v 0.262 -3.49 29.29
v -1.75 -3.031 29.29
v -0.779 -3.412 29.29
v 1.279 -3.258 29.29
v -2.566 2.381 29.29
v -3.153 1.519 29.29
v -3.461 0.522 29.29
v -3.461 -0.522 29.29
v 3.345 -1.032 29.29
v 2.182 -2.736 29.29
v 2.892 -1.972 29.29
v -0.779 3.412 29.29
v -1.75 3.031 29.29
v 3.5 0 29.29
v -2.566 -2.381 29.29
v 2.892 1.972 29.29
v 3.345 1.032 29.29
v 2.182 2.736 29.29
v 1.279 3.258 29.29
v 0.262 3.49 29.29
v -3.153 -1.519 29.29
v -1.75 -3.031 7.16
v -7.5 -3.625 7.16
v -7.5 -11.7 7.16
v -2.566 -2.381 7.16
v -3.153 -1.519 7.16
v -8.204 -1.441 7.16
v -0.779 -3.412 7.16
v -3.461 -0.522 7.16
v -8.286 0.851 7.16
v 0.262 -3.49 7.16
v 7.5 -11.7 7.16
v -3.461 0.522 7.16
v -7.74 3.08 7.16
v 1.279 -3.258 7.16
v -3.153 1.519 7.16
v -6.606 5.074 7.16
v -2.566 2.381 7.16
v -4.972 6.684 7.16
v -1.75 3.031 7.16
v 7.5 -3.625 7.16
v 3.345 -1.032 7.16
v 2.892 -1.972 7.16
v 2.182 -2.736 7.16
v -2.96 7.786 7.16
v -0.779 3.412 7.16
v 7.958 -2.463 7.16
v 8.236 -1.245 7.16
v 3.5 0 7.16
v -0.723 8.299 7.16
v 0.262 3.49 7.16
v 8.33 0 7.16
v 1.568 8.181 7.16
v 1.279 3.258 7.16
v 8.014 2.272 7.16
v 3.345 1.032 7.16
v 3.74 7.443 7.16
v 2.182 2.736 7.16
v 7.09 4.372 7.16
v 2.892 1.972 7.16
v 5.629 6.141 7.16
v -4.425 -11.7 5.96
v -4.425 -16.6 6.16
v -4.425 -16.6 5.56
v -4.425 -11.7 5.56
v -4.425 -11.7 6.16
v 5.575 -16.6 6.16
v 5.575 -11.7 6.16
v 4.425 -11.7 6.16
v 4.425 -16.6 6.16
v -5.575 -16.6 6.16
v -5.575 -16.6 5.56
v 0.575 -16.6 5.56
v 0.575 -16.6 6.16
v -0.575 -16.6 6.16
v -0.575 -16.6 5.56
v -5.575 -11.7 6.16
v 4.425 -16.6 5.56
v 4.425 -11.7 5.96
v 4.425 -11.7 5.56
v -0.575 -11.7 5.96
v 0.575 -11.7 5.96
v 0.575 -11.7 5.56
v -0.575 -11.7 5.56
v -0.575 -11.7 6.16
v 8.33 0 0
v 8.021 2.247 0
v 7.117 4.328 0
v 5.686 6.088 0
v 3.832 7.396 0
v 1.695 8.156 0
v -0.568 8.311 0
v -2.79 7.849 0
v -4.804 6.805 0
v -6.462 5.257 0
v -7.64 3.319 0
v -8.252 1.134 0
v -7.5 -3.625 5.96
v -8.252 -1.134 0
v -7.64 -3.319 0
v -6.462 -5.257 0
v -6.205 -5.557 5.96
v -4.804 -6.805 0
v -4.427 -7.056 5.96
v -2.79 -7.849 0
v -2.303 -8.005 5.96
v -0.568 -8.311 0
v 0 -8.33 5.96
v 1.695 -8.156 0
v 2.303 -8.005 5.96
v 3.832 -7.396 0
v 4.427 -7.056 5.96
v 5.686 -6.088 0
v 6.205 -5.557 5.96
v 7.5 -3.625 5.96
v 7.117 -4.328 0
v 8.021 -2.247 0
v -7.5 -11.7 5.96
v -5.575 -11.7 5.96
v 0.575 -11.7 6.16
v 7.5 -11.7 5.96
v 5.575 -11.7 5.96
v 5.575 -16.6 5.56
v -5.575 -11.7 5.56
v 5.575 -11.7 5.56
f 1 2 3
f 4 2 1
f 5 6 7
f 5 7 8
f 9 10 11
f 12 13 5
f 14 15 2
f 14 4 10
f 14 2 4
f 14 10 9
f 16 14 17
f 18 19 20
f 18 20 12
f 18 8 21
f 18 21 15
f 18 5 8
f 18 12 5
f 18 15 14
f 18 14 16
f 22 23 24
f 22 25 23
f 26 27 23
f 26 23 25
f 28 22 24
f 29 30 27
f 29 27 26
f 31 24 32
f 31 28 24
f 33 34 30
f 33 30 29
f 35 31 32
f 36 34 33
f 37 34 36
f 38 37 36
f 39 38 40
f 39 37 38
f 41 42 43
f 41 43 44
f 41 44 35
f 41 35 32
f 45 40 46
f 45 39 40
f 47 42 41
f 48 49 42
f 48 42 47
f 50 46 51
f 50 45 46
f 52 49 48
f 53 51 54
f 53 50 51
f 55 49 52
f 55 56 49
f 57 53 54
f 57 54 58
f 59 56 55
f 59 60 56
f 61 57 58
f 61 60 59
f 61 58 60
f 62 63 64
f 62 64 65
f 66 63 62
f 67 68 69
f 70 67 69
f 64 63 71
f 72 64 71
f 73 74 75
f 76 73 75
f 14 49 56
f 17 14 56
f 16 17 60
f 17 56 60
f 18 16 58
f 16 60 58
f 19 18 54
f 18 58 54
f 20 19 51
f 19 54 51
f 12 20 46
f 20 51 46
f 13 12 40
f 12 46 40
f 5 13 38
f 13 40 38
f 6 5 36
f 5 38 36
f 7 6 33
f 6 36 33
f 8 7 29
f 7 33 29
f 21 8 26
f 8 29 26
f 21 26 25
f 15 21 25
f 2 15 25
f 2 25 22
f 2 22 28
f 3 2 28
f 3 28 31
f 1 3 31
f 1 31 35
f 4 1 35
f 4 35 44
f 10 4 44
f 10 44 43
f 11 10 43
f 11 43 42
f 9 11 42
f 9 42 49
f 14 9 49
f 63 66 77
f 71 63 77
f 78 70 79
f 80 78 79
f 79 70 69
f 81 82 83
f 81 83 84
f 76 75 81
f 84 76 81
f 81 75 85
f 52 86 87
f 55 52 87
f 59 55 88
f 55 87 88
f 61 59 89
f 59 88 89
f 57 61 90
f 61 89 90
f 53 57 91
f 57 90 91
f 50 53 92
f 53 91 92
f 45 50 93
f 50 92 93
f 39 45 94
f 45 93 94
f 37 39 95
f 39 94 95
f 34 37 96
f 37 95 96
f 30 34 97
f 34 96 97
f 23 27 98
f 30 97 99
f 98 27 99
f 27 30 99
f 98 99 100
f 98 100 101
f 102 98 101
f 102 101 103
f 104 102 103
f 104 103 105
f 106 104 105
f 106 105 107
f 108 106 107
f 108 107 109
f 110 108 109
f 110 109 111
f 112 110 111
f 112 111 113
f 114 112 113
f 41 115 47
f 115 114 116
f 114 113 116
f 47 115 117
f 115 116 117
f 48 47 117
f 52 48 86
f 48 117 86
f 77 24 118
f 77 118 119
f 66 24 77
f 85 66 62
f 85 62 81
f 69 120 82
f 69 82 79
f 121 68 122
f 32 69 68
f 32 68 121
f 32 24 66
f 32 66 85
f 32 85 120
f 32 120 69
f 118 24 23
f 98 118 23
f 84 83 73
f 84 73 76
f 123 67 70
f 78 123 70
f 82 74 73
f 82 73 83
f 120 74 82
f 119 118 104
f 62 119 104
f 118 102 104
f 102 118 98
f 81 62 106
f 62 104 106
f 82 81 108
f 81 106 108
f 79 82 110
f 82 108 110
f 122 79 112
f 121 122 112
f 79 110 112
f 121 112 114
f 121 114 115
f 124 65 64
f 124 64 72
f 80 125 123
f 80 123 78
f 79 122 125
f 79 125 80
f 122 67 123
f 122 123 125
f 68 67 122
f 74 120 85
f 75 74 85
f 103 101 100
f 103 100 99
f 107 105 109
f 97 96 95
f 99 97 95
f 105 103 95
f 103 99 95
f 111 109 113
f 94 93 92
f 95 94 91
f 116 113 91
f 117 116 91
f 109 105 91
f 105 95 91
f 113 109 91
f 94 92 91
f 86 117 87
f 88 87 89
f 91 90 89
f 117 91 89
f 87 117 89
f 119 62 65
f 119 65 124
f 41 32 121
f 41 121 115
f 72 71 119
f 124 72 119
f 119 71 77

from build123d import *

# Parameters (mm, degrees)
SKETCH1_R           = 8.33
BOSS_EXTRUDE1_DEPTH = 7.16
SKETCH2_R           = 3.5
BOSS_EXTRUDE2_DEPTH = 22.13
SKETCH3_W           = 15
SKETCH3_H           = 11.20454244
BOSS_EXTRUDE3_DEPTH = 1.2
BOSS_EXTRUDE4_START = -0.2
SKETCH4_W           = 1.15
SKETCH4_H           = 4.9
BOSS_EXTRUDE4_DEPTH = 0.6
LPATTERN1_COUNT     = 2
LPATTERN1_PITCH     = 5
LPATTERN1_COL_COUNT = 2
LPATTERN1_COL_PITCH = 5


with BuildPart() as part:
    # Sketch1 → Boss-Extrude1 (new body)
    with BuildSketch(Plane.XY):
        Circle(SKETCH1_R)
    extrude(amount=BOSS_EXTRUDE1_DEPTH)

    # Sketch2 → Boss-Extrude2 (add)
    with BuildSketch(Plane.XY.offset(7.16)):
        Circle(SKETCH2_R)
    extrude(amount=BOSS_EXTRUDE2_DEPTH)

    # Sketch3 → Boss-Extrude3 (add)
    with BuildSketch(Plane.XY.offset(7.16)):
        with Locations((0, -6.09772878)):
            Rectangle(SKETCH3_W, SKETCH3_H)
    extrude(amount=-BOSS_EXTRUDE3_DEPTH)

    # Sketch4 → Boss-Extrude4 (add)
    with BuildSketch(Plane(origin=(0, 0, 5.96), x_dir=(-1, 0, 0), z_dir=(0, 0, -1)).offset(BOSS_EXTRUDE4_START)):
        with Locations((0, -14.15)):
            Rectangle(SKETCH4_W, SKETCH4_H)
    boss_extrude4 = extrude(amount=BOSS_EXTRUDE4_DEPTH)

    # LPattern1: Boss-Extrude4 ×2
    with Locations(*[(i * LPATTERN1_PITCH, 0, 0) for i in range(1, LPATTERN1_COUNT)]):
        add(boss_extrude4)

    # LPattern1 col: Boss-Extrude4 ×2
    with Locations(*[(-i * LPATTERN1_COL_PITCH, 0, 0) for i in range(1, LPATTERN1_COL_COUNT)]):
        add(boss_extrude4)


solid = part.part
